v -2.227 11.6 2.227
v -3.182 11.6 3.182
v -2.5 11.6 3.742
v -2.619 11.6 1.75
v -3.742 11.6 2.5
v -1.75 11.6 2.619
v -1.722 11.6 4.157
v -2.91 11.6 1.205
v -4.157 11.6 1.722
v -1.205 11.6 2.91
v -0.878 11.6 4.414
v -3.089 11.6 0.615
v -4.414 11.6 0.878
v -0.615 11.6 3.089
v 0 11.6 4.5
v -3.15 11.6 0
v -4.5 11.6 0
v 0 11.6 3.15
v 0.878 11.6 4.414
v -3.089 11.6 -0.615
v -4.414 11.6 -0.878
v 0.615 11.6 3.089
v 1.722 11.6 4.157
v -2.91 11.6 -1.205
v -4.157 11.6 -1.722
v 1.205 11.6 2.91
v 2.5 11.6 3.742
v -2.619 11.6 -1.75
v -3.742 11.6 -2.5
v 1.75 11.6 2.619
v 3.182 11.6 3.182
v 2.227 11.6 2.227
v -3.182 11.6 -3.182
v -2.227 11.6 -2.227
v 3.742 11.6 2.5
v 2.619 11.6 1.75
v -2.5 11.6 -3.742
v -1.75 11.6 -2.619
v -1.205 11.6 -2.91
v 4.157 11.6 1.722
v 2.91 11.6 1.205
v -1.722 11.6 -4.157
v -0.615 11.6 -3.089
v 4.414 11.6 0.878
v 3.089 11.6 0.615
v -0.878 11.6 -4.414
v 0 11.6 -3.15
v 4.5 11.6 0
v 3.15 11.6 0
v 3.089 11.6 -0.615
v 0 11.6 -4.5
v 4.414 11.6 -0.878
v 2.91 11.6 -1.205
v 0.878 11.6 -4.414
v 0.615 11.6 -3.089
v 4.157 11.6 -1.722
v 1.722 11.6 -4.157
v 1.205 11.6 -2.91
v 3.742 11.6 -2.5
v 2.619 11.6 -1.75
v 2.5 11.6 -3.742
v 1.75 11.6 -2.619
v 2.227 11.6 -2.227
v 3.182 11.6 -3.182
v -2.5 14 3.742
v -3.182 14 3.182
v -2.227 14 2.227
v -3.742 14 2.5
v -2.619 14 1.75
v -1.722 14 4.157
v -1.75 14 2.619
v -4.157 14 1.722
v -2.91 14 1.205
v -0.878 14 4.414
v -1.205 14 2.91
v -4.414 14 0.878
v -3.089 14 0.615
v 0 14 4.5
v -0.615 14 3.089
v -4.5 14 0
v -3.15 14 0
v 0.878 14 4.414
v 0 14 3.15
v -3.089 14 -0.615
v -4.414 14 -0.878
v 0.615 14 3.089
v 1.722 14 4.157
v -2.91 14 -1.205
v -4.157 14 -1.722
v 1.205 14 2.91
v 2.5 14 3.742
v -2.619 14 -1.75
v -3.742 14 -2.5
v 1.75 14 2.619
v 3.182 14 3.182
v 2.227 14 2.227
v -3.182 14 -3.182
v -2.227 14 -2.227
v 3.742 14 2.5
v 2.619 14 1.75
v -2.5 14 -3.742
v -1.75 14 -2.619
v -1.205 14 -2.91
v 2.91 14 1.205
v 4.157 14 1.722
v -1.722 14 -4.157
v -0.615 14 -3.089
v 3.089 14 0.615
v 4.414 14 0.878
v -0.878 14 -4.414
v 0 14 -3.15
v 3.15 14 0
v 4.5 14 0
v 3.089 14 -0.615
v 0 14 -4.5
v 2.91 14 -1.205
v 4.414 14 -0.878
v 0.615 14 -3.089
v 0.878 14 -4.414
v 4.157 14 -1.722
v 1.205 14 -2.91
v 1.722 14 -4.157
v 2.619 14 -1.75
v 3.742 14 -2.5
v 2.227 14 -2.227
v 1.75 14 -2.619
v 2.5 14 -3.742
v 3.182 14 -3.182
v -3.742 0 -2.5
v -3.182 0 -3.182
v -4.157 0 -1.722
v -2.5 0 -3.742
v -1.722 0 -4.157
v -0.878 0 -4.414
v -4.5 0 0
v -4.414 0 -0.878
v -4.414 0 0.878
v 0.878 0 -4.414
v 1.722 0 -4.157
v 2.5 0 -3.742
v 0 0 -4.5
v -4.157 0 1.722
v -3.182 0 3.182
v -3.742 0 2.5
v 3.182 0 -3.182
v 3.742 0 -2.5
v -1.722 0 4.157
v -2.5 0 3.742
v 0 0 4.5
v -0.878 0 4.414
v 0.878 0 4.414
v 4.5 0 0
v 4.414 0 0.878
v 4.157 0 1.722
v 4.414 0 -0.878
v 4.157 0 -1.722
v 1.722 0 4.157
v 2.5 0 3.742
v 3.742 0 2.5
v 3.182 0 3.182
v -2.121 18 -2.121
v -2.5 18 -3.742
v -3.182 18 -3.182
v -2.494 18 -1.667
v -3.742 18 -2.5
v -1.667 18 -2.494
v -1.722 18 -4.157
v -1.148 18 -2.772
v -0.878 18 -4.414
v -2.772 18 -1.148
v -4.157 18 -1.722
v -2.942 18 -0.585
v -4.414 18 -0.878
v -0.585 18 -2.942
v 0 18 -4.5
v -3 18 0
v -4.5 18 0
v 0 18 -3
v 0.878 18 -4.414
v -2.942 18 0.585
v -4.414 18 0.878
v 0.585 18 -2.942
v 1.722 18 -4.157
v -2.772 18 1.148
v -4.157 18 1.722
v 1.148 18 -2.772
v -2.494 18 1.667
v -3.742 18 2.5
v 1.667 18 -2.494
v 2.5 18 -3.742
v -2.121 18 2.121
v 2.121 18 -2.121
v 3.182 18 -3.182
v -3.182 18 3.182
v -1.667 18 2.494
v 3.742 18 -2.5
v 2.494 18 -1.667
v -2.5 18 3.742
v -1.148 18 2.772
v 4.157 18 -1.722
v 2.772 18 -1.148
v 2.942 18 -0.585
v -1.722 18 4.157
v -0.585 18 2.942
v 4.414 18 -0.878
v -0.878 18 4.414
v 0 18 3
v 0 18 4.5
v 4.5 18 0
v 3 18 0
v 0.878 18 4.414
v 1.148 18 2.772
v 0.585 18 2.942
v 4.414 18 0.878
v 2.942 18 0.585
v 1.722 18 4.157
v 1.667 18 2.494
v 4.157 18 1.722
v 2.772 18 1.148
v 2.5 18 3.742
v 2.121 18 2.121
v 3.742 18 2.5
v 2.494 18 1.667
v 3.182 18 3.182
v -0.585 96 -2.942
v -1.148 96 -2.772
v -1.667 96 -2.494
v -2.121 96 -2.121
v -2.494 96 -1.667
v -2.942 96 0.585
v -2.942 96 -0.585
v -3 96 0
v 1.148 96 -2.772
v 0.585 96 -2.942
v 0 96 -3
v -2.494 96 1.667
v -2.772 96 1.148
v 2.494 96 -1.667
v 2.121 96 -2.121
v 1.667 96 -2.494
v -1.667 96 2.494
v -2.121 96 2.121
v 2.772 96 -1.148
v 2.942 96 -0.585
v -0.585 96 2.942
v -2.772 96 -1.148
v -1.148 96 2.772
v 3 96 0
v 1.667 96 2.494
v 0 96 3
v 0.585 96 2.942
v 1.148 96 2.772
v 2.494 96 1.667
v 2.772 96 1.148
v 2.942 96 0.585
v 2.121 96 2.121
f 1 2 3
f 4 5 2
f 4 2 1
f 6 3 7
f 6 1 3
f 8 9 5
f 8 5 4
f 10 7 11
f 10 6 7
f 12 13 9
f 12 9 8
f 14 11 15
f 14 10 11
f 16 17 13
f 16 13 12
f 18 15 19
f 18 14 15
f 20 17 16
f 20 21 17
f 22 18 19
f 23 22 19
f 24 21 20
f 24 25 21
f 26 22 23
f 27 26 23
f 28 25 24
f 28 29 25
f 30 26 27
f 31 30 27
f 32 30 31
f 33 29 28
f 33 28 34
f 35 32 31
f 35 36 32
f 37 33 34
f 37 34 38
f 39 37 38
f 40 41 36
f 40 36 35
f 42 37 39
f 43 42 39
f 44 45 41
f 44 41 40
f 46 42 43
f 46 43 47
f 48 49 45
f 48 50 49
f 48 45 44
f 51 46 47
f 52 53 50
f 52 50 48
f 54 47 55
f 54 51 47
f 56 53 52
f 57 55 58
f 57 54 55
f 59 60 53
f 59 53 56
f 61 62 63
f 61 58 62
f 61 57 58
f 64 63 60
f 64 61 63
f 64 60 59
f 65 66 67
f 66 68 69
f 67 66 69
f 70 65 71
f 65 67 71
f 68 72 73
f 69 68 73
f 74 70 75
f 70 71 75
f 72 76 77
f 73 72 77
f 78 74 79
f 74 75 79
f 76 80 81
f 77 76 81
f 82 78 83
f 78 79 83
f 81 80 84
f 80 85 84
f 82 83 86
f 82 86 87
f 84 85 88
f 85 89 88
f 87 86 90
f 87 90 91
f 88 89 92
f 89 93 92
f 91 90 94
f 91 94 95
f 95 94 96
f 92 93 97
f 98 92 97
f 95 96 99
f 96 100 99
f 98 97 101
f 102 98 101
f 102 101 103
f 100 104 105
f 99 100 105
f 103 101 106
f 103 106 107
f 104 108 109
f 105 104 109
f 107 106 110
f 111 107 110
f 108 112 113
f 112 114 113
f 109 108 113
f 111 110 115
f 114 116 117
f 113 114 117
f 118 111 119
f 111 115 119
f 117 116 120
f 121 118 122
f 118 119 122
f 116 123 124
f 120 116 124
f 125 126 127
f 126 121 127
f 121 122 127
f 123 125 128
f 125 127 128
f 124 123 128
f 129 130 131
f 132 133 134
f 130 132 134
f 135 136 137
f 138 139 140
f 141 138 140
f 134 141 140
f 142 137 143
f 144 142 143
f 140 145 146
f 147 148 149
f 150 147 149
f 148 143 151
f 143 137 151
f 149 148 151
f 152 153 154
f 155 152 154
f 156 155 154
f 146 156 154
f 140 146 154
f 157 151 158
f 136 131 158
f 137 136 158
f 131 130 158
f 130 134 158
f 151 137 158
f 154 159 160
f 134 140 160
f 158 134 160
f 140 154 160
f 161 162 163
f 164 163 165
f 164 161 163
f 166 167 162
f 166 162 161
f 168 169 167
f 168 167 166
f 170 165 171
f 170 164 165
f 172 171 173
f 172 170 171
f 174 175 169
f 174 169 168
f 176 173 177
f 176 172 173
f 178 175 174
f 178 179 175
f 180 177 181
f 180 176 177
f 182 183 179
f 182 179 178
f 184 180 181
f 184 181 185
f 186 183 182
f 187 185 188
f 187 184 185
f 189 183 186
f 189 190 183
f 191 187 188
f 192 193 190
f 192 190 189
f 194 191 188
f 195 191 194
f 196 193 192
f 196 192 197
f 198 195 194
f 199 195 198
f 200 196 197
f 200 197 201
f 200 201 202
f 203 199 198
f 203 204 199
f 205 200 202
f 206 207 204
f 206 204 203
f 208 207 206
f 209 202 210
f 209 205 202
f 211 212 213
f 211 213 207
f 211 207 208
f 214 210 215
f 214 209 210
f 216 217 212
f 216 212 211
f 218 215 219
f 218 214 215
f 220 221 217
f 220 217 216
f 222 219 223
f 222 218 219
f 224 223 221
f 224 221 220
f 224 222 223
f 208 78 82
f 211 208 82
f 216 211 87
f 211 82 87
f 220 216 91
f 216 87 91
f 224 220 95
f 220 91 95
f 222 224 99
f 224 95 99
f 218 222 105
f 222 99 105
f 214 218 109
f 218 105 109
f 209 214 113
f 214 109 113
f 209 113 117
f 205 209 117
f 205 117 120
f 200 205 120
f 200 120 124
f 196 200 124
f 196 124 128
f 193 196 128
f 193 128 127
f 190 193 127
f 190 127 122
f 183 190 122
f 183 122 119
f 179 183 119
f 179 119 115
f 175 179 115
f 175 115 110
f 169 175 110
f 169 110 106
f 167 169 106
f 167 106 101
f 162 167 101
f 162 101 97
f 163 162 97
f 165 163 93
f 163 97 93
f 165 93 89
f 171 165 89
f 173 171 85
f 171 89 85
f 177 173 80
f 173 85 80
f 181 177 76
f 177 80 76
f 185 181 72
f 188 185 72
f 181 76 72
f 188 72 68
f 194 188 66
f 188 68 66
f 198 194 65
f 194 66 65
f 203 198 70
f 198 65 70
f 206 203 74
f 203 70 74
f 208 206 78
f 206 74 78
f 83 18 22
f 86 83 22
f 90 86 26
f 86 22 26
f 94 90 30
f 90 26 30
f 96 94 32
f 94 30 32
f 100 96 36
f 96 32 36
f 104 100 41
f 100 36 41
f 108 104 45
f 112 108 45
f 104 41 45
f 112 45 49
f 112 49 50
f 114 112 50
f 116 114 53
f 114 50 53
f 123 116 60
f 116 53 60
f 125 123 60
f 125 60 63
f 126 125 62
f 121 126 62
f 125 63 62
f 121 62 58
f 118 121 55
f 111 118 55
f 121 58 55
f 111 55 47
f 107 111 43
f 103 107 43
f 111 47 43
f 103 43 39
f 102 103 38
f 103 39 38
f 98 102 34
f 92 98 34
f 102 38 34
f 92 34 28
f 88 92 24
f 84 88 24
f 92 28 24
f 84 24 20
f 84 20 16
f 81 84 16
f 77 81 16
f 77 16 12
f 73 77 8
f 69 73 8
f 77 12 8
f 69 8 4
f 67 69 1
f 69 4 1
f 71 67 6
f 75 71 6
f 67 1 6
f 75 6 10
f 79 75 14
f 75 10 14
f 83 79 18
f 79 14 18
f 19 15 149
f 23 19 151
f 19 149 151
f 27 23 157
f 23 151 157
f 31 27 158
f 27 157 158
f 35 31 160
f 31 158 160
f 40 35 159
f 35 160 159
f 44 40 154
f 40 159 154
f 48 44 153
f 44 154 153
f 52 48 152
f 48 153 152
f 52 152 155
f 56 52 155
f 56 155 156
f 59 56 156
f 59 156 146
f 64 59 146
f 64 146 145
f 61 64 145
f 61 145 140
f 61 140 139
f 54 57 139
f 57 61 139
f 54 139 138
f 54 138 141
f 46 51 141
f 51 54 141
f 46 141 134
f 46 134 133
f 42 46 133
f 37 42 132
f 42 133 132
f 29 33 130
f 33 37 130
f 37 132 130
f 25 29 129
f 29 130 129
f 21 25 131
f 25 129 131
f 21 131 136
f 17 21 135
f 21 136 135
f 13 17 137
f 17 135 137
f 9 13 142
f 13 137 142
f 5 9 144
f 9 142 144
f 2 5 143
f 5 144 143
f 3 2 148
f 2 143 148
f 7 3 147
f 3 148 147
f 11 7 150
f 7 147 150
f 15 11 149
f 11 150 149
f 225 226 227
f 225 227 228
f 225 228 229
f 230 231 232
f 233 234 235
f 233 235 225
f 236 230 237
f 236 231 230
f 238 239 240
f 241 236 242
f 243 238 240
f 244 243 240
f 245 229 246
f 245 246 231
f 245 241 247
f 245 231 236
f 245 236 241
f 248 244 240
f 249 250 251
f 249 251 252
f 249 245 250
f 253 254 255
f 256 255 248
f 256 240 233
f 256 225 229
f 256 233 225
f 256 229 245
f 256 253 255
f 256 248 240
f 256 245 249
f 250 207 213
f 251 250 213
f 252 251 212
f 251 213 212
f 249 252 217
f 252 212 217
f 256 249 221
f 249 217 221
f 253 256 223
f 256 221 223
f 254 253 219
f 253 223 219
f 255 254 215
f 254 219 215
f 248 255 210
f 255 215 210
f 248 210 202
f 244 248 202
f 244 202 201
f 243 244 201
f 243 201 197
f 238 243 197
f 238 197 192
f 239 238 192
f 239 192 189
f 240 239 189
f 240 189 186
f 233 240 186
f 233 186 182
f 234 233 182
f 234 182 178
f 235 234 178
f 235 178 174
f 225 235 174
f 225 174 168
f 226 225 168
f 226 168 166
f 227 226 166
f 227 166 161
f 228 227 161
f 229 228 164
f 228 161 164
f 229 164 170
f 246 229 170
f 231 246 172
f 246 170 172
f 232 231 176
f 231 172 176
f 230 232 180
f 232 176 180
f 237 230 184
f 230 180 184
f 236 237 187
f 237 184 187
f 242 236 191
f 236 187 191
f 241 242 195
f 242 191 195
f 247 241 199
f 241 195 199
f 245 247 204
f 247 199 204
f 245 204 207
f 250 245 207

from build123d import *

# Parameters (mm, degrees)
SKETCH_1_R          = 4.5
EXTRUDE_1_DEPTH     = 18
SKETCH_2_R          = 3
EXTRUDE_2_DEPTH     = 96
CUT_EXTRUDE_START   = 11.6
SKETCH_3_OUTSIDE_W  = 30.368
SKETCH_3_OUTSIDE_H  = 30.368
SKETCH_3_OUTSIDE_R  = 3.15
CUT_EXTRUDE_1_DEPTH = 2.4


with BuildPart() as part:
    # 草图1 → 凸台-拉伸1 (new body)
    with BuildSketch(Plane(origin=(0, 0, 0), x_dir=(1, 0, 0), z_dir=(0, 1, 0))):
        with Locations(Location((0, 0, 0), (0, 0, 270))):
            Circle(SKETCH_1_R)
    extrude(amount=EXTRUDE_1_DEPTH)

    # 草图2 → 凸台-拉伸2 (add)
    with BuildSketch(Plane(origin=(0, 0, 0), x_dir=(1, 0, 0), z_dir=(0, 1, 0))):
        with Locations(Location((0, 0, 0), (0, 0, 270))):
            Circle(SKETCH_2_R)
    extrude(amount=EXTRUDE_2_DEPTH)

    # 草图3 outside → 切除-拉伸1 (cut)
    with BuildSketch(Plane(origin=(0, 0, 0), x_dir=(1, 0, 0), z_dir=(0, 1, 0)).offset(CUT_EXTRUDE_START)):
        Rectangle(SKETCH_3_OUTSIDE_W, SKETCH_3_OUTSIDE_H)
        with Locations(Location((0, 0, 0), (0, 0, 270))):
            Circle(SKETCH_3_OUTSIDE_R, mode=Mode.SUBTRACT)
    extrude(amount=CUT_EXTRUDE_1_DEPTH, mode=Mode.SUBTRACT)


solid = part.part
